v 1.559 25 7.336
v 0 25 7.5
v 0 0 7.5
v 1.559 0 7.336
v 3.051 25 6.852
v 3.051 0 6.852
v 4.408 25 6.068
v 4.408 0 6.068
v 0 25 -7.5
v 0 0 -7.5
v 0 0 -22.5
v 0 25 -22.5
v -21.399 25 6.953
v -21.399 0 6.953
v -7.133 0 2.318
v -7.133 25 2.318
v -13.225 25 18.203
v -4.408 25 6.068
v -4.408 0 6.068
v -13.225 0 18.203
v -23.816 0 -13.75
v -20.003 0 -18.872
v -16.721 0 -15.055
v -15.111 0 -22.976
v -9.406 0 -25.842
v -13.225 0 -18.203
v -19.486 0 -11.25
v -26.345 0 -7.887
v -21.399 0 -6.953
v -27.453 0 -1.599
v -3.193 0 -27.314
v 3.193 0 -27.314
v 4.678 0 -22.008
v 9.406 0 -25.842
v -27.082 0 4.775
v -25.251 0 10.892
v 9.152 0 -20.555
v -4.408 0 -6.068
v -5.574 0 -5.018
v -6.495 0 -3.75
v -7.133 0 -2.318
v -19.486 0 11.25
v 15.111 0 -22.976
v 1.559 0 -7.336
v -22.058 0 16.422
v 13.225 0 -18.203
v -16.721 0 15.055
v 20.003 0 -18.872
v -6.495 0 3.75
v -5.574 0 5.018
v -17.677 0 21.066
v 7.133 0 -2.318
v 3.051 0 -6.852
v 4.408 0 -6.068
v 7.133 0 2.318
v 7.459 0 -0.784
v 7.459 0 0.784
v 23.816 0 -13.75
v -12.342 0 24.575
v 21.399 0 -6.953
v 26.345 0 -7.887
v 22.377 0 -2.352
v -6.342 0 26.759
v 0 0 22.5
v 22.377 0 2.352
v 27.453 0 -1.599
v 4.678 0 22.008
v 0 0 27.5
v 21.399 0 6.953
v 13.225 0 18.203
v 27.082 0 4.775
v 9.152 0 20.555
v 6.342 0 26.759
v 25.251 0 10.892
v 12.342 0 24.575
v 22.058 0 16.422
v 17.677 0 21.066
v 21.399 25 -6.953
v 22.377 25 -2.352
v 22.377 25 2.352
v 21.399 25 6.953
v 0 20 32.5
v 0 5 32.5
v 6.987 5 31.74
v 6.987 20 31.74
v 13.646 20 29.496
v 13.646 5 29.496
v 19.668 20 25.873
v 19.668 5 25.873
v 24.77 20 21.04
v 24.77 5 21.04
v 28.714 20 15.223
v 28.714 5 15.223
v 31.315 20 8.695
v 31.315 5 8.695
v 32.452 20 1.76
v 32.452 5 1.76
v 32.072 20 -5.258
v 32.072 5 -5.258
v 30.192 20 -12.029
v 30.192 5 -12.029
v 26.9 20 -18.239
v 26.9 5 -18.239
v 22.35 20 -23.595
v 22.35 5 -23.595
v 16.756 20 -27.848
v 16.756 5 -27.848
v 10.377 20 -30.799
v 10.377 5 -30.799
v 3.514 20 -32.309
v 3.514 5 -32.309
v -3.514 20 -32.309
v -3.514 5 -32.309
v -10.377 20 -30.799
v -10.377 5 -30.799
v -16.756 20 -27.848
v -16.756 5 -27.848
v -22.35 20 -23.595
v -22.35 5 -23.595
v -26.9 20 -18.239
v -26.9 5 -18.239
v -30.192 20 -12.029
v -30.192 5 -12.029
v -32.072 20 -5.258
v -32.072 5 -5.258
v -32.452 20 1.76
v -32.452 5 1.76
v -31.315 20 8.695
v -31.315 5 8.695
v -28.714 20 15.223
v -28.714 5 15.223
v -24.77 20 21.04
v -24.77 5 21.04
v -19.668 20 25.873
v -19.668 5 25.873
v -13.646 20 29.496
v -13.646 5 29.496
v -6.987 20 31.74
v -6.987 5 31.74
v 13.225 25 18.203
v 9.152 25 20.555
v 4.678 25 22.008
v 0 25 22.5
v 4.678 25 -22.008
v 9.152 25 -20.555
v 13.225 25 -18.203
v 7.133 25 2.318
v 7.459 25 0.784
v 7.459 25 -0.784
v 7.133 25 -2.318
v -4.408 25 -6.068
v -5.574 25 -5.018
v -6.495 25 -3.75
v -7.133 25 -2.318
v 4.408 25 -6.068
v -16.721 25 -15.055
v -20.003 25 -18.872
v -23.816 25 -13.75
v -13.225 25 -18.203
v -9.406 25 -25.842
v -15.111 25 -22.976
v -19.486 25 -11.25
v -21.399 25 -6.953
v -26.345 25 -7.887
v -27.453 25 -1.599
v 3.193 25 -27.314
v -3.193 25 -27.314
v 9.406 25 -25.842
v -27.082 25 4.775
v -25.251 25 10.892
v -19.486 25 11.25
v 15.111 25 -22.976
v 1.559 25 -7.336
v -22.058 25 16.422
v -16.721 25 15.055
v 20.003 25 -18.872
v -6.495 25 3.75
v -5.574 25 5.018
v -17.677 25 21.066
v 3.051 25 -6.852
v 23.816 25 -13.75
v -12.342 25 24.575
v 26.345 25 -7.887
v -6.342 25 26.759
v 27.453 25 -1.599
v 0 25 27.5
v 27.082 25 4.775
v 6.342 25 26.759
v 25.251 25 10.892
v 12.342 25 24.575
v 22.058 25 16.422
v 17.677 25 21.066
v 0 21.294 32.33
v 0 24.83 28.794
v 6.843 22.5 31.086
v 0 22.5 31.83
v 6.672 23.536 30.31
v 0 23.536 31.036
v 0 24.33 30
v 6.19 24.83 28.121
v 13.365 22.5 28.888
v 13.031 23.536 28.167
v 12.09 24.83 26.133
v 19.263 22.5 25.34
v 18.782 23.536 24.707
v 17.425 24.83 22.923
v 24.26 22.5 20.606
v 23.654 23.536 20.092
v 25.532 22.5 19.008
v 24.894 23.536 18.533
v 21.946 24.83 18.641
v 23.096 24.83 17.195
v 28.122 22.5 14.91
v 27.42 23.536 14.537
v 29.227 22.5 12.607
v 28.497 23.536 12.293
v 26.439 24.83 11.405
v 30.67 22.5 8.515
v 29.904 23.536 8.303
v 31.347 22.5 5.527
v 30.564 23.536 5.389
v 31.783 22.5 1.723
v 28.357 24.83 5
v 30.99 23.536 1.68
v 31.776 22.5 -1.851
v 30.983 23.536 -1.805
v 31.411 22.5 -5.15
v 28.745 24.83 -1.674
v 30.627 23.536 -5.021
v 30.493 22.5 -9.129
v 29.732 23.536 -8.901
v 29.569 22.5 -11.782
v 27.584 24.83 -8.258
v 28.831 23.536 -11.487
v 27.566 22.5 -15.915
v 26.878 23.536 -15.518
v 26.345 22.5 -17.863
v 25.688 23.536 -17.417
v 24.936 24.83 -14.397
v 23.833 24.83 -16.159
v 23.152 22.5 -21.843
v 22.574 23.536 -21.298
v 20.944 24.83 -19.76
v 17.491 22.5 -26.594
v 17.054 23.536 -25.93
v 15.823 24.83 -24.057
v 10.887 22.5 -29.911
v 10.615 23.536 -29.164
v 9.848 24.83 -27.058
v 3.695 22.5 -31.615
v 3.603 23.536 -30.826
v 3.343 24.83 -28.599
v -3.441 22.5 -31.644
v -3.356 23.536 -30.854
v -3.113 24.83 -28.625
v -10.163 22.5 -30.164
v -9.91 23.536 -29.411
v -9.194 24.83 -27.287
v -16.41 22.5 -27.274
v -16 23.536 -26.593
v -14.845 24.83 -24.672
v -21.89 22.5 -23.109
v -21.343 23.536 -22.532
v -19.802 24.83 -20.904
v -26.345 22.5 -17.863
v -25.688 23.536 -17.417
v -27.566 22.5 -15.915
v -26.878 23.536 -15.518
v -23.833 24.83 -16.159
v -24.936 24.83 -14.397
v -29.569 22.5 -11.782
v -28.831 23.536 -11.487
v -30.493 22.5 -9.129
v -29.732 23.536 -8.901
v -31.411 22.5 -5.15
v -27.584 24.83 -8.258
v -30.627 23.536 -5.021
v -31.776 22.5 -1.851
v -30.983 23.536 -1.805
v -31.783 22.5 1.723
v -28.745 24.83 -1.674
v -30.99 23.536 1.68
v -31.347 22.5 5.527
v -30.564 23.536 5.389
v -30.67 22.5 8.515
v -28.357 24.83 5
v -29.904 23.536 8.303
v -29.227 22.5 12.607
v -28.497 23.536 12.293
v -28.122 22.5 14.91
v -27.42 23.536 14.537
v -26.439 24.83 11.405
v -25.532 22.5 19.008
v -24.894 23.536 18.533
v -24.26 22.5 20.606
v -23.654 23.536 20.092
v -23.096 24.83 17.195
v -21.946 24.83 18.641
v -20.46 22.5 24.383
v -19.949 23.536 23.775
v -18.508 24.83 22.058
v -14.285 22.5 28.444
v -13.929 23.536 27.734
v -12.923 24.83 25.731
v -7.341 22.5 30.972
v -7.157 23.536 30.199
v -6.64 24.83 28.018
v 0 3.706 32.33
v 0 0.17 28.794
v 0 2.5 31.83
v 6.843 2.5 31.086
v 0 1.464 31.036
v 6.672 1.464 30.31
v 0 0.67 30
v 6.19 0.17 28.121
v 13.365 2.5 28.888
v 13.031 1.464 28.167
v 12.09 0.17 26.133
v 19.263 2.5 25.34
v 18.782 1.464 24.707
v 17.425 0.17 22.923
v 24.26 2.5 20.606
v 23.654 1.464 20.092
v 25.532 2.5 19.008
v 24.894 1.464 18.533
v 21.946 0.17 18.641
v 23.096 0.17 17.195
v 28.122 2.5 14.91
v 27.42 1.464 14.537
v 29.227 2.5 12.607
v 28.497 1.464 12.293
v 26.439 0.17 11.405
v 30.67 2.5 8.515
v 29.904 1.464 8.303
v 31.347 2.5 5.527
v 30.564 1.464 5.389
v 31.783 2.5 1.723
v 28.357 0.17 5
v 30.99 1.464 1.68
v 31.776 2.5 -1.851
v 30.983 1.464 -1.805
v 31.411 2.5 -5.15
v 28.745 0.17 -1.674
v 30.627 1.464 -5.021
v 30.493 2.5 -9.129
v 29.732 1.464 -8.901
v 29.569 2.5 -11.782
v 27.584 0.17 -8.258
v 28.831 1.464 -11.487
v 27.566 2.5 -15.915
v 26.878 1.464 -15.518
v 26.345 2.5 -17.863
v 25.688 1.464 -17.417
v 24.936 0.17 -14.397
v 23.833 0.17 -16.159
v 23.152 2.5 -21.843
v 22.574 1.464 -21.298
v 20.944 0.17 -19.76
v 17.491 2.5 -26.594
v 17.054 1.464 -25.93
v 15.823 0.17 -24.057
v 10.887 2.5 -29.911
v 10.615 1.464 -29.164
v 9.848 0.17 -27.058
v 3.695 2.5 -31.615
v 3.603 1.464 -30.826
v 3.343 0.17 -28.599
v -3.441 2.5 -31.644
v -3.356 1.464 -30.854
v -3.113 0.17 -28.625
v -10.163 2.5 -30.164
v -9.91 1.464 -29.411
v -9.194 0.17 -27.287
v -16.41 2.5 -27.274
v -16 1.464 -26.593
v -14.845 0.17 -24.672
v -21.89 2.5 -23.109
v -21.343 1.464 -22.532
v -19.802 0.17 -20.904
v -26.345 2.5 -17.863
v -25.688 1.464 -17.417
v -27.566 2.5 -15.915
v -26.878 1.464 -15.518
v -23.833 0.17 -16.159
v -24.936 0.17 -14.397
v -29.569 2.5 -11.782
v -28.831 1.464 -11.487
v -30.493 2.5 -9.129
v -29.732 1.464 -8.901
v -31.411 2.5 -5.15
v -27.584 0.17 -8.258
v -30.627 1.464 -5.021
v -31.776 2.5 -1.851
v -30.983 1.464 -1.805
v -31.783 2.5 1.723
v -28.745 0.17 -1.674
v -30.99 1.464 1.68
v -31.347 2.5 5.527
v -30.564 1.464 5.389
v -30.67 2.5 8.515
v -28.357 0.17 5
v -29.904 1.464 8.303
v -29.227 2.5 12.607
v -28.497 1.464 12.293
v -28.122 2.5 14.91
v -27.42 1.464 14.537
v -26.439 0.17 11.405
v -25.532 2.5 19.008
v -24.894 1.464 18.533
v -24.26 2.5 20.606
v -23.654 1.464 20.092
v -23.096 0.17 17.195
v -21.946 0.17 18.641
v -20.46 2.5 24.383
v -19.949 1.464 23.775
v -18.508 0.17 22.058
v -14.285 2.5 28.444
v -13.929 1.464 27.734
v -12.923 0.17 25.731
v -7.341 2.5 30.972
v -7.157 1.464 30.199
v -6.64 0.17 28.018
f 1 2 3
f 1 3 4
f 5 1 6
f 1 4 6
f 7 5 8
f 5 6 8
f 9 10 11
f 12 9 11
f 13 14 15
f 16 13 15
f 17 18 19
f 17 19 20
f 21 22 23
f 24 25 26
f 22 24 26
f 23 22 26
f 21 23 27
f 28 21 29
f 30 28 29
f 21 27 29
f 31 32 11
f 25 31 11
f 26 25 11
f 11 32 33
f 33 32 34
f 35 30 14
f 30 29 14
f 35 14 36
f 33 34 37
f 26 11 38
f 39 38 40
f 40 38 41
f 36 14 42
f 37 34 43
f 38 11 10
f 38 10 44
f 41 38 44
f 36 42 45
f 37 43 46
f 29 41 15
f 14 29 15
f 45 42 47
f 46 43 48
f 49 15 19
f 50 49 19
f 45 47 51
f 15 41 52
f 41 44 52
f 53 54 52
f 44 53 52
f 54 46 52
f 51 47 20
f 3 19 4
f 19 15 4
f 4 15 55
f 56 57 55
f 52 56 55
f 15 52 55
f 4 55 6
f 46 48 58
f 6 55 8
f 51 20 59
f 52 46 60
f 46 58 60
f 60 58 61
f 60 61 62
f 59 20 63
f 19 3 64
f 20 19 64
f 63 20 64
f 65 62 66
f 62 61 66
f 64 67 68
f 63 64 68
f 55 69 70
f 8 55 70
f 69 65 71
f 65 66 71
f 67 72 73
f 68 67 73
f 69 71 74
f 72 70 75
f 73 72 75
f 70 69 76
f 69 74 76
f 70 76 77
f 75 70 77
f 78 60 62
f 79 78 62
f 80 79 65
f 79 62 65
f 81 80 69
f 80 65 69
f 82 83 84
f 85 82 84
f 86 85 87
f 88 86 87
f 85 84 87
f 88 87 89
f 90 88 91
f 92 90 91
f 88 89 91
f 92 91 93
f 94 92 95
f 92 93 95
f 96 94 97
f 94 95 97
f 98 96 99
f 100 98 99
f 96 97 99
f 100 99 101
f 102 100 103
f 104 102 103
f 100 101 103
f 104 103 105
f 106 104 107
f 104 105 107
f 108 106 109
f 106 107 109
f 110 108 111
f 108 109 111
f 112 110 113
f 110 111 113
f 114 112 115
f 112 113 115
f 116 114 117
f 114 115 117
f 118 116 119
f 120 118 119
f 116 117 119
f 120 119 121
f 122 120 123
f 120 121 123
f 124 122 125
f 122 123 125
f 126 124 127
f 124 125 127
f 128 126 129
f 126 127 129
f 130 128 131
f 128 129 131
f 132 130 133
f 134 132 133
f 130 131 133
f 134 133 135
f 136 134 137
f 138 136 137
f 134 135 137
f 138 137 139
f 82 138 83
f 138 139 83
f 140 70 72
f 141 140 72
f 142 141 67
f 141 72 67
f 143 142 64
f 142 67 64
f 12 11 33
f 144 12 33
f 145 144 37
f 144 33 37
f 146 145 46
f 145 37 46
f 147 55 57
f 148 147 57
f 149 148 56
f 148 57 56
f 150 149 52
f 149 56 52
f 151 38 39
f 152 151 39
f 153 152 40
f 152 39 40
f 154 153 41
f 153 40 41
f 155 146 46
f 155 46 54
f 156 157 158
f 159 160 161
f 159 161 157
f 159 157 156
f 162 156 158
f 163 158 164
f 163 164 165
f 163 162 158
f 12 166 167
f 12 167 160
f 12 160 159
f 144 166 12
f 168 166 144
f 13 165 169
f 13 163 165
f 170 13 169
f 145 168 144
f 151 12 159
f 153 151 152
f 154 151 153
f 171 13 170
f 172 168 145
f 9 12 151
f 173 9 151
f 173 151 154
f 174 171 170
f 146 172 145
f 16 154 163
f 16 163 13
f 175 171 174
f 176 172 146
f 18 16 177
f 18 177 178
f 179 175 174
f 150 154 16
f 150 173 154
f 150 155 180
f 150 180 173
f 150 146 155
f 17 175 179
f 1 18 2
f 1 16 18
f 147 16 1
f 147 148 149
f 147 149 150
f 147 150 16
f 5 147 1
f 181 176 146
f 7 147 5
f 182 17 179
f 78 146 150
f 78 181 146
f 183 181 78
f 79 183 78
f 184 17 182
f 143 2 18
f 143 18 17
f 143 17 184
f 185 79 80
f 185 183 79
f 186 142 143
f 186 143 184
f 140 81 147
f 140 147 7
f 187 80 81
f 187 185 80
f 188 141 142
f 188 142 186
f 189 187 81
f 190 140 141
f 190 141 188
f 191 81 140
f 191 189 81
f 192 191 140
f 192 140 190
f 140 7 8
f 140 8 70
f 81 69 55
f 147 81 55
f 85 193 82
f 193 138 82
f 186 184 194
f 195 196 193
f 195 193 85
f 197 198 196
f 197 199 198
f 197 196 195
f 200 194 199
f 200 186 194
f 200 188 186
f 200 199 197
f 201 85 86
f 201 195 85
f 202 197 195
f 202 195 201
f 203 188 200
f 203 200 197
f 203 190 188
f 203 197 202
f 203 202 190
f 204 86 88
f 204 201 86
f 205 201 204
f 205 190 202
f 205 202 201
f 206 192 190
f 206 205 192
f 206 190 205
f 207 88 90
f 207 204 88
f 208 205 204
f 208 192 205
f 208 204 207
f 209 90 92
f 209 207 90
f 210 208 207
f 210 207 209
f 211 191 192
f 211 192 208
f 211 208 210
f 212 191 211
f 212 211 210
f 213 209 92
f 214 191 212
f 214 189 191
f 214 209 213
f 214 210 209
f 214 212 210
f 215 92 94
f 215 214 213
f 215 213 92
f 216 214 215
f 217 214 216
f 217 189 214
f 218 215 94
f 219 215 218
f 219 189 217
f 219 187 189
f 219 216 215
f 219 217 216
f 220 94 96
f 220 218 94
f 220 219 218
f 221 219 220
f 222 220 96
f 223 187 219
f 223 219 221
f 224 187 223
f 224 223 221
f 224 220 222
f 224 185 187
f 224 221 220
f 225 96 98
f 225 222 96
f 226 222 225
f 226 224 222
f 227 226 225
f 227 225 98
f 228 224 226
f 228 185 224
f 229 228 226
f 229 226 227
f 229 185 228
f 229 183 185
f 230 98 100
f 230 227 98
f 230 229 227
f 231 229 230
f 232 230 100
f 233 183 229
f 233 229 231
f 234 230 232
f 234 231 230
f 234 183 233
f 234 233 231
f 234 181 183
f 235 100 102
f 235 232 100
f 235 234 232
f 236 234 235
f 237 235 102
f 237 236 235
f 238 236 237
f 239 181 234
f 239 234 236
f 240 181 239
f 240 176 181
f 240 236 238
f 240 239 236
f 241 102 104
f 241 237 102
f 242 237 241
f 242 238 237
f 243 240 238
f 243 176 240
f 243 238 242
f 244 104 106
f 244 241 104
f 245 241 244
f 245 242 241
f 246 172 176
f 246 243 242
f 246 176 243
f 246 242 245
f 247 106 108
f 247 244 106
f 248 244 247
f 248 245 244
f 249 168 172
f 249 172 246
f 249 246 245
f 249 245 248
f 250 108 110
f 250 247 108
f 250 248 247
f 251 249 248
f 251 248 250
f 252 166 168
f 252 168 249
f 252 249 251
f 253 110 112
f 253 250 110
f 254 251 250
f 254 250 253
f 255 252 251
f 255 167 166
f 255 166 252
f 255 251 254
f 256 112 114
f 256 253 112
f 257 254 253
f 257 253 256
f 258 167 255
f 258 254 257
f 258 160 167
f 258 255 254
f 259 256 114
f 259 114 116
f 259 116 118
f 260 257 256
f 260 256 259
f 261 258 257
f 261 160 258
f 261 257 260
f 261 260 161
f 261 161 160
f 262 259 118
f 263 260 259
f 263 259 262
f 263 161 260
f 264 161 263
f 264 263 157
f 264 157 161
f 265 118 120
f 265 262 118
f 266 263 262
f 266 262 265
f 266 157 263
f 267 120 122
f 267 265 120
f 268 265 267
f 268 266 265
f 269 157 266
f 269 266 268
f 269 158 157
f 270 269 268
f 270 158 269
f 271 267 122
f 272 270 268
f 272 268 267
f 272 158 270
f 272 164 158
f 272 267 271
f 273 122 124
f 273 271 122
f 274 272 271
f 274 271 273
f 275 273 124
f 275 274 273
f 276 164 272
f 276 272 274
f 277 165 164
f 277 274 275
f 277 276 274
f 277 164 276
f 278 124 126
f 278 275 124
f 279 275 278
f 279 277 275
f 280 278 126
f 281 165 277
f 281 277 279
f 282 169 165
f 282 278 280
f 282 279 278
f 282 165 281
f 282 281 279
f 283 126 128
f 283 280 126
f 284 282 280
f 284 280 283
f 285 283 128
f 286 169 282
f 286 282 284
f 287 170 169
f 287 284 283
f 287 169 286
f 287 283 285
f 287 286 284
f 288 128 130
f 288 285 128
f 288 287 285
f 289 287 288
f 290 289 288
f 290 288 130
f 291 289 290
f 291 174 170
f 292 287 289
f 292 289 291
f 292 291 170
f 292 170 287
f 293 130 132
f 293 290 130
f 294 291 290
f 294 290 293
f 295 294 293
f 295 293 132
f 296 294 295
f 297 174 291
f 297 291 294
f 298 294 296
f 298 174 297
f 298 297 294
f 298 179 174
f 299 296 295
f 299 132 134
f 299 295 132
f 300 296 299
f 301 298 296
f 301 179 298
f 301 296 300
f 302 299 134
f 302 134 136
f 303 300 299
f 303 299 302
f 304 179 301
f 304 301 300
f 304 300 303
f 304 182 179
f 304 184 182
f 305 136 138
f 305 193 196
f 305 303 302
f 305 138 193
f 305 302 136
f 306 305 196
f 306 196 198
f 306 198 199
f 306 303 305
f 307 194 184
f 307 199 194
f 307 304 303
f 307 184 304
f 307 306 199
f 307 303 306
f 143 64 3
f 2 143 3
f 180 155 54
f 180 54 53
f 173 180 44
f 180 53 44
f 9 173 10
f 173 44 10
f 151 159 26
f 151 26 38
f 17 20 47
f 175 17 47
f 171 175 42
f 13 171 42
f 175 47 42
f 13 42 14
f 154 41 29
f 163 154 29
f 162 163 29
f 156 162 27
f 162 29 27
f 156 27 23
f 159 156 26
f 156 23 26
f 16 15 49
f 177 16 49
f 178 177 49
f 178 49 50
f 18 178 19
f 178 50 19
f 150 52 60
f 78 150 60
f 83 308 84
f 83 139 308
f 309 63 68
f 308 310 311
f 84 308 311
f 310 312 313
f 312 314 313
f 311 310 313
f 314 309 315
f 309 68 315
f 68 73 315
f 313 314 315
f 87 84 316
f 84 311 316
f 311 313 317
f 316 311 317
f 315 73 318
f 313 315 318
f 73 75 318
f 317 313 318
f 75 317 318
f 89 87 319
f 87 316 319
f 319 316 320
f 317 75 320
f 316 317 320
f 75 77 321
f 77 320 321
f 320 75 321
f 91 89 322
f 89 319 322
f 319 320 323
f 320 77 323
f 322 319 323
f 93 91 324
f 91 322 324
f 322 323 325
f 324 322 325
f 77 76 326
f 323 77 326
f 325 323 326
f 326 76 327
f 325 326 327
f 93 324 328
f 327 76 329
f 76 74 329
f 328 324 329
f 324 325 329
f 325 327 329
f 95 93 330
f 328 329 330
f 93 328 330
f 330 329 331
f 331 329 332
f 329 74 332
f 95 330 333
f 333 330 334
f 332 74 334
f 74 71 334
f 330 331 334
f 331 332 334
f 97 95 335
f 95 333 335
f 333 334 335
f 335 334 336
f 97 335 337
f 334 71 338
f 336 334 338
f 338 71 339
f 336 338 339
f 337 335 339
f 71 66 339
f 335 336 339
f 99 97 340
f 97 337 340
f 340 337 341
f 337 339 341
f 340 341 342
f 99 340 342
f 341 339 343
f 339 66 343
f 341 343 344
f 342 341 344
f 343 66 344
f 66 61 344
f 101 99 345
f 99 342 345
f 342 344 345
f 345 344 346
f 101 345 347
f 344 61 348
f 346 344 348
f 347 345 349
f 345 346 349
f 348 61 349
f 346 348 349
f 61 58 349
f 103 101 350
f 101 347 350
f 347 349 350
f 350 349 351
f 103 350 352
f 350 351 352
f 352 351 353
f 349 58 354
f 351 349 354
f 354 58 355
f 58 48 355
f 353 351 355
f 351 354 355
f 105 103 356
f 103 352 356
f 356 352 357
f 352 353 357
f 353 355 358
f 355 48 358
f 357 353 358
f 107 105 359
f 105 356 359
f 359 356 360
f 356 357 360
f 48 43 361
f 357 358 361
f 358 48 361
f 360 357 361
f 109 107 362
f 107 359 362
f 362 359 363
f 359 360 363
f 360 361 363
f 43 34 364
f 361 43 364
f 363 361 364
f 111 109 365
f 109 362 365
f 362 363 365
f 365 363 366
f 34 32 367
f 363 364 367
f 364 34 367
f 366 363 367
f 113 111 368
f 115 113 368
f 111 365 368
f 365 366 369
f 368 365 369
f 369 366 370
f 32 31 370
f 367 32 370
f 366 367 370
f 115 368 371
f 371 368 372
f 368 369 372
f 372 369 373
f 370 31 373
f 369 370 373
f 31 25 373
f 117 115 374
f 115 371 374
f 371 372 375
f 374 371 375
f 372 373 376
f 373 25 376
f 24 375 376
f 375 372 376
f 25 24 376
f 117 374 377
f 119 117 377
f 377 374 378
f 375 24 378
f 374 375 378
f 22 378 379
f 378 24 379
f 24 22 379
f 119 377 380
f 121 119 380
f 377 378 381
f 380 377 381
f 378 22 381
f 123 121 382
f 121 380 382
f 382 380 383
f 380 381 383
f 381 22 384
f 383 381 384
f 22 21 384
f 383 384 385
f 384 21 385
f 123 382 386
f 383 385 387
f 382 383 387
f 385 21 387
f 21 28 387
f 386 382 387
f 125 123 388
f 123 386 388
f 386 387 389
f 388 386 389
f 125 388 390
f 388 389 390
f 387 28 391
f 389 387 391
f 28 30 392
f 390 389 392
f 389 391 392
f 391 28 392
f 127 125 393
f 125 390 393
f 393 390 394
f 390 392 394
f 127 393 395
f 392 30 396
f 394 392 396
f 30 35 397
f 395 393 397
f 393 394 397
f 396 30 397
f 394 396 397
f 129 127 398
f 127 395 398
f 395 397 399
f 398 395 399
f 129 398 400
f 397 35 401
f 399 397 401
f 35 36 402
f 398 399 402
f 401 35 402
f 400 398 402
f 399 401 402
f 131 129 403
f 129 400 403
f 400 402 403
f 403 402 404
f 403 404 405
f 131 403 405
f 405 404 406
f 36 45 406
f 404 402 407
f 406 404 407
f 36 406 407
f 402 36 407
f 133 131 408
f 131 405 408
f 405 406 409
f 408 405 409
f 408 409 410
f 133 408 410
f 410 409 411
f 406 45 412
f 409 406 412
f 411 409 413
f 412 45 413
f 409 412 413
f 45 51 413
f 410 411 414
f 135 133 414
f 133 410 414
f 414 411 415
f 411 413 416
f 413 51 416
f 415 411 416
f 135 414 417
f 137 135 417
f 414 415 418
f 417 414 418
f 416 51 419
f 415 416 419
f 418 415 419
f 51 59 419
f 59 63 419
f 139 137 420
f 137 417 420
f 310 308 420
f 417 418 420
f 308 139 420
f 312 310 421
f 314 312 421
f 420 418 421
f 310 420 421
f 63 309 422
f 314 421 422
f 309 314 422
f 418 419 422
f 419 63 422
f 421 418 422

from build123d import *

# Parameters (mm, degrees)
SKETCH_1_R      = 32.5
EXTRUDE_1_DEPTH = 25
FILLET_1_R      = 5
FILLET_2_R      = 5


with BuildPart() as part:
    # 草图1 → 凸台-拉伸1 (new body)
    with BuildSketch(Plane(origin=(0, 0, 0), x_dir=(1, 0, 0), z_dir=(0, 1, 0))):
        with Locations(Location((0, 0, 0), (0, 0, 270))):
            Circle(SKETCH_1_R)
        with BuildLine():
            Line((0, 7.5), (0, 22.5))
            ThreePointArc((0, 22.5), (6.952882373, 21.398771617), (13.225168177, 18.202882373))
            Line((13.225168177, 18.202882373), (4.408389392, 6.067627458))
            ThreePointArc((4.408389392, 6.067627458), (2.317627458, 7.132923872), (0, 7.5))
        make_face(mode=Mode.SUBTRACT)
        with BuildLine():
            Line((7.132923872, 2.317627458), (21.398771617, 6.952882373))
            ThreePointArc((21.398771617, 6.952882373), (22.5, 0), (21.398771617, -6.952882373))
            Line((21.398771617, -6.952882373), (7.132923872, -2.317627458))
            ThreePointArc((7.132923872, -2.317627458), (7.5, 0), (7.132923872, 2.317627458))
        make_face(mode=Mode.SUBTRACT)
        with BuildLine():
            Line((4.408389392, -6.067627458), (13.225168177, -18.202882373))
            ThreePointArc((13.225168177, -18.202882373), (6.952882373, -21.398771617), (0, -22.5))
            Line((0, -22.5), (0, -7.5))
            ThreePointArc((0, -7.5), (2.317627458, -7.132923872), (4.408389392, -6.067627458))
        make_face(mode=Mode.SUBTRACT)
        with BuildLine():
            Line((-4.408389392, -6.067627458), (-13.225168177, -18.202882373))
            ThreePointArc((-13.225168177, -18.202882373), (-18.202882373, -13.225168177), (-21.398771617, -6.952882373))
            Line((-21.398771617, -6.952882373), (-7.132923872, -2.317627458))
            ThreePointArc((-7.132923872, -2.317627458), (-6.067627458, -4.408389392), (-4.408389392, -6.067627458))
        make_face(mode=Mode.SUBTRACT)
        with BuildLine():
            Line((-7.132923872, 2.317627458), (-21.398771617, 6.952882373))
            ThreePointArc((-21.398771617, 6.952882373), (-18.202882373, 13.225168177), (-13.225168177, 18.202882373))
            Line((-13.225168177, 18.202882373), (-4.408389392, 6.067627458))
            ThreePointArc((-4.408389392, 6.067627458), (-6.067627458, 4.408389392), (-7.132923872, 2.317627458))
        make_face(mode=Mode.SUBTRACT)
    extrude(amount=EXTRUDE_1_DEPTH)

    # 圆角1
    fillet_1_edges = [part.edges().sort_by_distance(p)[0] for p in [
        (0, 25, -32.5),
    ]]
    fillet(fillet_1_edges, radius=FILLET_1_R)

    # 圆角2
    fillet_2_edges = [part.edges().sort_by_distance(p)[0] for p in [
        (0, 0, -32.5),
    ]]
    fillet(fillet_2_edges, radius=FILLET_2_R)


solid = part.part
